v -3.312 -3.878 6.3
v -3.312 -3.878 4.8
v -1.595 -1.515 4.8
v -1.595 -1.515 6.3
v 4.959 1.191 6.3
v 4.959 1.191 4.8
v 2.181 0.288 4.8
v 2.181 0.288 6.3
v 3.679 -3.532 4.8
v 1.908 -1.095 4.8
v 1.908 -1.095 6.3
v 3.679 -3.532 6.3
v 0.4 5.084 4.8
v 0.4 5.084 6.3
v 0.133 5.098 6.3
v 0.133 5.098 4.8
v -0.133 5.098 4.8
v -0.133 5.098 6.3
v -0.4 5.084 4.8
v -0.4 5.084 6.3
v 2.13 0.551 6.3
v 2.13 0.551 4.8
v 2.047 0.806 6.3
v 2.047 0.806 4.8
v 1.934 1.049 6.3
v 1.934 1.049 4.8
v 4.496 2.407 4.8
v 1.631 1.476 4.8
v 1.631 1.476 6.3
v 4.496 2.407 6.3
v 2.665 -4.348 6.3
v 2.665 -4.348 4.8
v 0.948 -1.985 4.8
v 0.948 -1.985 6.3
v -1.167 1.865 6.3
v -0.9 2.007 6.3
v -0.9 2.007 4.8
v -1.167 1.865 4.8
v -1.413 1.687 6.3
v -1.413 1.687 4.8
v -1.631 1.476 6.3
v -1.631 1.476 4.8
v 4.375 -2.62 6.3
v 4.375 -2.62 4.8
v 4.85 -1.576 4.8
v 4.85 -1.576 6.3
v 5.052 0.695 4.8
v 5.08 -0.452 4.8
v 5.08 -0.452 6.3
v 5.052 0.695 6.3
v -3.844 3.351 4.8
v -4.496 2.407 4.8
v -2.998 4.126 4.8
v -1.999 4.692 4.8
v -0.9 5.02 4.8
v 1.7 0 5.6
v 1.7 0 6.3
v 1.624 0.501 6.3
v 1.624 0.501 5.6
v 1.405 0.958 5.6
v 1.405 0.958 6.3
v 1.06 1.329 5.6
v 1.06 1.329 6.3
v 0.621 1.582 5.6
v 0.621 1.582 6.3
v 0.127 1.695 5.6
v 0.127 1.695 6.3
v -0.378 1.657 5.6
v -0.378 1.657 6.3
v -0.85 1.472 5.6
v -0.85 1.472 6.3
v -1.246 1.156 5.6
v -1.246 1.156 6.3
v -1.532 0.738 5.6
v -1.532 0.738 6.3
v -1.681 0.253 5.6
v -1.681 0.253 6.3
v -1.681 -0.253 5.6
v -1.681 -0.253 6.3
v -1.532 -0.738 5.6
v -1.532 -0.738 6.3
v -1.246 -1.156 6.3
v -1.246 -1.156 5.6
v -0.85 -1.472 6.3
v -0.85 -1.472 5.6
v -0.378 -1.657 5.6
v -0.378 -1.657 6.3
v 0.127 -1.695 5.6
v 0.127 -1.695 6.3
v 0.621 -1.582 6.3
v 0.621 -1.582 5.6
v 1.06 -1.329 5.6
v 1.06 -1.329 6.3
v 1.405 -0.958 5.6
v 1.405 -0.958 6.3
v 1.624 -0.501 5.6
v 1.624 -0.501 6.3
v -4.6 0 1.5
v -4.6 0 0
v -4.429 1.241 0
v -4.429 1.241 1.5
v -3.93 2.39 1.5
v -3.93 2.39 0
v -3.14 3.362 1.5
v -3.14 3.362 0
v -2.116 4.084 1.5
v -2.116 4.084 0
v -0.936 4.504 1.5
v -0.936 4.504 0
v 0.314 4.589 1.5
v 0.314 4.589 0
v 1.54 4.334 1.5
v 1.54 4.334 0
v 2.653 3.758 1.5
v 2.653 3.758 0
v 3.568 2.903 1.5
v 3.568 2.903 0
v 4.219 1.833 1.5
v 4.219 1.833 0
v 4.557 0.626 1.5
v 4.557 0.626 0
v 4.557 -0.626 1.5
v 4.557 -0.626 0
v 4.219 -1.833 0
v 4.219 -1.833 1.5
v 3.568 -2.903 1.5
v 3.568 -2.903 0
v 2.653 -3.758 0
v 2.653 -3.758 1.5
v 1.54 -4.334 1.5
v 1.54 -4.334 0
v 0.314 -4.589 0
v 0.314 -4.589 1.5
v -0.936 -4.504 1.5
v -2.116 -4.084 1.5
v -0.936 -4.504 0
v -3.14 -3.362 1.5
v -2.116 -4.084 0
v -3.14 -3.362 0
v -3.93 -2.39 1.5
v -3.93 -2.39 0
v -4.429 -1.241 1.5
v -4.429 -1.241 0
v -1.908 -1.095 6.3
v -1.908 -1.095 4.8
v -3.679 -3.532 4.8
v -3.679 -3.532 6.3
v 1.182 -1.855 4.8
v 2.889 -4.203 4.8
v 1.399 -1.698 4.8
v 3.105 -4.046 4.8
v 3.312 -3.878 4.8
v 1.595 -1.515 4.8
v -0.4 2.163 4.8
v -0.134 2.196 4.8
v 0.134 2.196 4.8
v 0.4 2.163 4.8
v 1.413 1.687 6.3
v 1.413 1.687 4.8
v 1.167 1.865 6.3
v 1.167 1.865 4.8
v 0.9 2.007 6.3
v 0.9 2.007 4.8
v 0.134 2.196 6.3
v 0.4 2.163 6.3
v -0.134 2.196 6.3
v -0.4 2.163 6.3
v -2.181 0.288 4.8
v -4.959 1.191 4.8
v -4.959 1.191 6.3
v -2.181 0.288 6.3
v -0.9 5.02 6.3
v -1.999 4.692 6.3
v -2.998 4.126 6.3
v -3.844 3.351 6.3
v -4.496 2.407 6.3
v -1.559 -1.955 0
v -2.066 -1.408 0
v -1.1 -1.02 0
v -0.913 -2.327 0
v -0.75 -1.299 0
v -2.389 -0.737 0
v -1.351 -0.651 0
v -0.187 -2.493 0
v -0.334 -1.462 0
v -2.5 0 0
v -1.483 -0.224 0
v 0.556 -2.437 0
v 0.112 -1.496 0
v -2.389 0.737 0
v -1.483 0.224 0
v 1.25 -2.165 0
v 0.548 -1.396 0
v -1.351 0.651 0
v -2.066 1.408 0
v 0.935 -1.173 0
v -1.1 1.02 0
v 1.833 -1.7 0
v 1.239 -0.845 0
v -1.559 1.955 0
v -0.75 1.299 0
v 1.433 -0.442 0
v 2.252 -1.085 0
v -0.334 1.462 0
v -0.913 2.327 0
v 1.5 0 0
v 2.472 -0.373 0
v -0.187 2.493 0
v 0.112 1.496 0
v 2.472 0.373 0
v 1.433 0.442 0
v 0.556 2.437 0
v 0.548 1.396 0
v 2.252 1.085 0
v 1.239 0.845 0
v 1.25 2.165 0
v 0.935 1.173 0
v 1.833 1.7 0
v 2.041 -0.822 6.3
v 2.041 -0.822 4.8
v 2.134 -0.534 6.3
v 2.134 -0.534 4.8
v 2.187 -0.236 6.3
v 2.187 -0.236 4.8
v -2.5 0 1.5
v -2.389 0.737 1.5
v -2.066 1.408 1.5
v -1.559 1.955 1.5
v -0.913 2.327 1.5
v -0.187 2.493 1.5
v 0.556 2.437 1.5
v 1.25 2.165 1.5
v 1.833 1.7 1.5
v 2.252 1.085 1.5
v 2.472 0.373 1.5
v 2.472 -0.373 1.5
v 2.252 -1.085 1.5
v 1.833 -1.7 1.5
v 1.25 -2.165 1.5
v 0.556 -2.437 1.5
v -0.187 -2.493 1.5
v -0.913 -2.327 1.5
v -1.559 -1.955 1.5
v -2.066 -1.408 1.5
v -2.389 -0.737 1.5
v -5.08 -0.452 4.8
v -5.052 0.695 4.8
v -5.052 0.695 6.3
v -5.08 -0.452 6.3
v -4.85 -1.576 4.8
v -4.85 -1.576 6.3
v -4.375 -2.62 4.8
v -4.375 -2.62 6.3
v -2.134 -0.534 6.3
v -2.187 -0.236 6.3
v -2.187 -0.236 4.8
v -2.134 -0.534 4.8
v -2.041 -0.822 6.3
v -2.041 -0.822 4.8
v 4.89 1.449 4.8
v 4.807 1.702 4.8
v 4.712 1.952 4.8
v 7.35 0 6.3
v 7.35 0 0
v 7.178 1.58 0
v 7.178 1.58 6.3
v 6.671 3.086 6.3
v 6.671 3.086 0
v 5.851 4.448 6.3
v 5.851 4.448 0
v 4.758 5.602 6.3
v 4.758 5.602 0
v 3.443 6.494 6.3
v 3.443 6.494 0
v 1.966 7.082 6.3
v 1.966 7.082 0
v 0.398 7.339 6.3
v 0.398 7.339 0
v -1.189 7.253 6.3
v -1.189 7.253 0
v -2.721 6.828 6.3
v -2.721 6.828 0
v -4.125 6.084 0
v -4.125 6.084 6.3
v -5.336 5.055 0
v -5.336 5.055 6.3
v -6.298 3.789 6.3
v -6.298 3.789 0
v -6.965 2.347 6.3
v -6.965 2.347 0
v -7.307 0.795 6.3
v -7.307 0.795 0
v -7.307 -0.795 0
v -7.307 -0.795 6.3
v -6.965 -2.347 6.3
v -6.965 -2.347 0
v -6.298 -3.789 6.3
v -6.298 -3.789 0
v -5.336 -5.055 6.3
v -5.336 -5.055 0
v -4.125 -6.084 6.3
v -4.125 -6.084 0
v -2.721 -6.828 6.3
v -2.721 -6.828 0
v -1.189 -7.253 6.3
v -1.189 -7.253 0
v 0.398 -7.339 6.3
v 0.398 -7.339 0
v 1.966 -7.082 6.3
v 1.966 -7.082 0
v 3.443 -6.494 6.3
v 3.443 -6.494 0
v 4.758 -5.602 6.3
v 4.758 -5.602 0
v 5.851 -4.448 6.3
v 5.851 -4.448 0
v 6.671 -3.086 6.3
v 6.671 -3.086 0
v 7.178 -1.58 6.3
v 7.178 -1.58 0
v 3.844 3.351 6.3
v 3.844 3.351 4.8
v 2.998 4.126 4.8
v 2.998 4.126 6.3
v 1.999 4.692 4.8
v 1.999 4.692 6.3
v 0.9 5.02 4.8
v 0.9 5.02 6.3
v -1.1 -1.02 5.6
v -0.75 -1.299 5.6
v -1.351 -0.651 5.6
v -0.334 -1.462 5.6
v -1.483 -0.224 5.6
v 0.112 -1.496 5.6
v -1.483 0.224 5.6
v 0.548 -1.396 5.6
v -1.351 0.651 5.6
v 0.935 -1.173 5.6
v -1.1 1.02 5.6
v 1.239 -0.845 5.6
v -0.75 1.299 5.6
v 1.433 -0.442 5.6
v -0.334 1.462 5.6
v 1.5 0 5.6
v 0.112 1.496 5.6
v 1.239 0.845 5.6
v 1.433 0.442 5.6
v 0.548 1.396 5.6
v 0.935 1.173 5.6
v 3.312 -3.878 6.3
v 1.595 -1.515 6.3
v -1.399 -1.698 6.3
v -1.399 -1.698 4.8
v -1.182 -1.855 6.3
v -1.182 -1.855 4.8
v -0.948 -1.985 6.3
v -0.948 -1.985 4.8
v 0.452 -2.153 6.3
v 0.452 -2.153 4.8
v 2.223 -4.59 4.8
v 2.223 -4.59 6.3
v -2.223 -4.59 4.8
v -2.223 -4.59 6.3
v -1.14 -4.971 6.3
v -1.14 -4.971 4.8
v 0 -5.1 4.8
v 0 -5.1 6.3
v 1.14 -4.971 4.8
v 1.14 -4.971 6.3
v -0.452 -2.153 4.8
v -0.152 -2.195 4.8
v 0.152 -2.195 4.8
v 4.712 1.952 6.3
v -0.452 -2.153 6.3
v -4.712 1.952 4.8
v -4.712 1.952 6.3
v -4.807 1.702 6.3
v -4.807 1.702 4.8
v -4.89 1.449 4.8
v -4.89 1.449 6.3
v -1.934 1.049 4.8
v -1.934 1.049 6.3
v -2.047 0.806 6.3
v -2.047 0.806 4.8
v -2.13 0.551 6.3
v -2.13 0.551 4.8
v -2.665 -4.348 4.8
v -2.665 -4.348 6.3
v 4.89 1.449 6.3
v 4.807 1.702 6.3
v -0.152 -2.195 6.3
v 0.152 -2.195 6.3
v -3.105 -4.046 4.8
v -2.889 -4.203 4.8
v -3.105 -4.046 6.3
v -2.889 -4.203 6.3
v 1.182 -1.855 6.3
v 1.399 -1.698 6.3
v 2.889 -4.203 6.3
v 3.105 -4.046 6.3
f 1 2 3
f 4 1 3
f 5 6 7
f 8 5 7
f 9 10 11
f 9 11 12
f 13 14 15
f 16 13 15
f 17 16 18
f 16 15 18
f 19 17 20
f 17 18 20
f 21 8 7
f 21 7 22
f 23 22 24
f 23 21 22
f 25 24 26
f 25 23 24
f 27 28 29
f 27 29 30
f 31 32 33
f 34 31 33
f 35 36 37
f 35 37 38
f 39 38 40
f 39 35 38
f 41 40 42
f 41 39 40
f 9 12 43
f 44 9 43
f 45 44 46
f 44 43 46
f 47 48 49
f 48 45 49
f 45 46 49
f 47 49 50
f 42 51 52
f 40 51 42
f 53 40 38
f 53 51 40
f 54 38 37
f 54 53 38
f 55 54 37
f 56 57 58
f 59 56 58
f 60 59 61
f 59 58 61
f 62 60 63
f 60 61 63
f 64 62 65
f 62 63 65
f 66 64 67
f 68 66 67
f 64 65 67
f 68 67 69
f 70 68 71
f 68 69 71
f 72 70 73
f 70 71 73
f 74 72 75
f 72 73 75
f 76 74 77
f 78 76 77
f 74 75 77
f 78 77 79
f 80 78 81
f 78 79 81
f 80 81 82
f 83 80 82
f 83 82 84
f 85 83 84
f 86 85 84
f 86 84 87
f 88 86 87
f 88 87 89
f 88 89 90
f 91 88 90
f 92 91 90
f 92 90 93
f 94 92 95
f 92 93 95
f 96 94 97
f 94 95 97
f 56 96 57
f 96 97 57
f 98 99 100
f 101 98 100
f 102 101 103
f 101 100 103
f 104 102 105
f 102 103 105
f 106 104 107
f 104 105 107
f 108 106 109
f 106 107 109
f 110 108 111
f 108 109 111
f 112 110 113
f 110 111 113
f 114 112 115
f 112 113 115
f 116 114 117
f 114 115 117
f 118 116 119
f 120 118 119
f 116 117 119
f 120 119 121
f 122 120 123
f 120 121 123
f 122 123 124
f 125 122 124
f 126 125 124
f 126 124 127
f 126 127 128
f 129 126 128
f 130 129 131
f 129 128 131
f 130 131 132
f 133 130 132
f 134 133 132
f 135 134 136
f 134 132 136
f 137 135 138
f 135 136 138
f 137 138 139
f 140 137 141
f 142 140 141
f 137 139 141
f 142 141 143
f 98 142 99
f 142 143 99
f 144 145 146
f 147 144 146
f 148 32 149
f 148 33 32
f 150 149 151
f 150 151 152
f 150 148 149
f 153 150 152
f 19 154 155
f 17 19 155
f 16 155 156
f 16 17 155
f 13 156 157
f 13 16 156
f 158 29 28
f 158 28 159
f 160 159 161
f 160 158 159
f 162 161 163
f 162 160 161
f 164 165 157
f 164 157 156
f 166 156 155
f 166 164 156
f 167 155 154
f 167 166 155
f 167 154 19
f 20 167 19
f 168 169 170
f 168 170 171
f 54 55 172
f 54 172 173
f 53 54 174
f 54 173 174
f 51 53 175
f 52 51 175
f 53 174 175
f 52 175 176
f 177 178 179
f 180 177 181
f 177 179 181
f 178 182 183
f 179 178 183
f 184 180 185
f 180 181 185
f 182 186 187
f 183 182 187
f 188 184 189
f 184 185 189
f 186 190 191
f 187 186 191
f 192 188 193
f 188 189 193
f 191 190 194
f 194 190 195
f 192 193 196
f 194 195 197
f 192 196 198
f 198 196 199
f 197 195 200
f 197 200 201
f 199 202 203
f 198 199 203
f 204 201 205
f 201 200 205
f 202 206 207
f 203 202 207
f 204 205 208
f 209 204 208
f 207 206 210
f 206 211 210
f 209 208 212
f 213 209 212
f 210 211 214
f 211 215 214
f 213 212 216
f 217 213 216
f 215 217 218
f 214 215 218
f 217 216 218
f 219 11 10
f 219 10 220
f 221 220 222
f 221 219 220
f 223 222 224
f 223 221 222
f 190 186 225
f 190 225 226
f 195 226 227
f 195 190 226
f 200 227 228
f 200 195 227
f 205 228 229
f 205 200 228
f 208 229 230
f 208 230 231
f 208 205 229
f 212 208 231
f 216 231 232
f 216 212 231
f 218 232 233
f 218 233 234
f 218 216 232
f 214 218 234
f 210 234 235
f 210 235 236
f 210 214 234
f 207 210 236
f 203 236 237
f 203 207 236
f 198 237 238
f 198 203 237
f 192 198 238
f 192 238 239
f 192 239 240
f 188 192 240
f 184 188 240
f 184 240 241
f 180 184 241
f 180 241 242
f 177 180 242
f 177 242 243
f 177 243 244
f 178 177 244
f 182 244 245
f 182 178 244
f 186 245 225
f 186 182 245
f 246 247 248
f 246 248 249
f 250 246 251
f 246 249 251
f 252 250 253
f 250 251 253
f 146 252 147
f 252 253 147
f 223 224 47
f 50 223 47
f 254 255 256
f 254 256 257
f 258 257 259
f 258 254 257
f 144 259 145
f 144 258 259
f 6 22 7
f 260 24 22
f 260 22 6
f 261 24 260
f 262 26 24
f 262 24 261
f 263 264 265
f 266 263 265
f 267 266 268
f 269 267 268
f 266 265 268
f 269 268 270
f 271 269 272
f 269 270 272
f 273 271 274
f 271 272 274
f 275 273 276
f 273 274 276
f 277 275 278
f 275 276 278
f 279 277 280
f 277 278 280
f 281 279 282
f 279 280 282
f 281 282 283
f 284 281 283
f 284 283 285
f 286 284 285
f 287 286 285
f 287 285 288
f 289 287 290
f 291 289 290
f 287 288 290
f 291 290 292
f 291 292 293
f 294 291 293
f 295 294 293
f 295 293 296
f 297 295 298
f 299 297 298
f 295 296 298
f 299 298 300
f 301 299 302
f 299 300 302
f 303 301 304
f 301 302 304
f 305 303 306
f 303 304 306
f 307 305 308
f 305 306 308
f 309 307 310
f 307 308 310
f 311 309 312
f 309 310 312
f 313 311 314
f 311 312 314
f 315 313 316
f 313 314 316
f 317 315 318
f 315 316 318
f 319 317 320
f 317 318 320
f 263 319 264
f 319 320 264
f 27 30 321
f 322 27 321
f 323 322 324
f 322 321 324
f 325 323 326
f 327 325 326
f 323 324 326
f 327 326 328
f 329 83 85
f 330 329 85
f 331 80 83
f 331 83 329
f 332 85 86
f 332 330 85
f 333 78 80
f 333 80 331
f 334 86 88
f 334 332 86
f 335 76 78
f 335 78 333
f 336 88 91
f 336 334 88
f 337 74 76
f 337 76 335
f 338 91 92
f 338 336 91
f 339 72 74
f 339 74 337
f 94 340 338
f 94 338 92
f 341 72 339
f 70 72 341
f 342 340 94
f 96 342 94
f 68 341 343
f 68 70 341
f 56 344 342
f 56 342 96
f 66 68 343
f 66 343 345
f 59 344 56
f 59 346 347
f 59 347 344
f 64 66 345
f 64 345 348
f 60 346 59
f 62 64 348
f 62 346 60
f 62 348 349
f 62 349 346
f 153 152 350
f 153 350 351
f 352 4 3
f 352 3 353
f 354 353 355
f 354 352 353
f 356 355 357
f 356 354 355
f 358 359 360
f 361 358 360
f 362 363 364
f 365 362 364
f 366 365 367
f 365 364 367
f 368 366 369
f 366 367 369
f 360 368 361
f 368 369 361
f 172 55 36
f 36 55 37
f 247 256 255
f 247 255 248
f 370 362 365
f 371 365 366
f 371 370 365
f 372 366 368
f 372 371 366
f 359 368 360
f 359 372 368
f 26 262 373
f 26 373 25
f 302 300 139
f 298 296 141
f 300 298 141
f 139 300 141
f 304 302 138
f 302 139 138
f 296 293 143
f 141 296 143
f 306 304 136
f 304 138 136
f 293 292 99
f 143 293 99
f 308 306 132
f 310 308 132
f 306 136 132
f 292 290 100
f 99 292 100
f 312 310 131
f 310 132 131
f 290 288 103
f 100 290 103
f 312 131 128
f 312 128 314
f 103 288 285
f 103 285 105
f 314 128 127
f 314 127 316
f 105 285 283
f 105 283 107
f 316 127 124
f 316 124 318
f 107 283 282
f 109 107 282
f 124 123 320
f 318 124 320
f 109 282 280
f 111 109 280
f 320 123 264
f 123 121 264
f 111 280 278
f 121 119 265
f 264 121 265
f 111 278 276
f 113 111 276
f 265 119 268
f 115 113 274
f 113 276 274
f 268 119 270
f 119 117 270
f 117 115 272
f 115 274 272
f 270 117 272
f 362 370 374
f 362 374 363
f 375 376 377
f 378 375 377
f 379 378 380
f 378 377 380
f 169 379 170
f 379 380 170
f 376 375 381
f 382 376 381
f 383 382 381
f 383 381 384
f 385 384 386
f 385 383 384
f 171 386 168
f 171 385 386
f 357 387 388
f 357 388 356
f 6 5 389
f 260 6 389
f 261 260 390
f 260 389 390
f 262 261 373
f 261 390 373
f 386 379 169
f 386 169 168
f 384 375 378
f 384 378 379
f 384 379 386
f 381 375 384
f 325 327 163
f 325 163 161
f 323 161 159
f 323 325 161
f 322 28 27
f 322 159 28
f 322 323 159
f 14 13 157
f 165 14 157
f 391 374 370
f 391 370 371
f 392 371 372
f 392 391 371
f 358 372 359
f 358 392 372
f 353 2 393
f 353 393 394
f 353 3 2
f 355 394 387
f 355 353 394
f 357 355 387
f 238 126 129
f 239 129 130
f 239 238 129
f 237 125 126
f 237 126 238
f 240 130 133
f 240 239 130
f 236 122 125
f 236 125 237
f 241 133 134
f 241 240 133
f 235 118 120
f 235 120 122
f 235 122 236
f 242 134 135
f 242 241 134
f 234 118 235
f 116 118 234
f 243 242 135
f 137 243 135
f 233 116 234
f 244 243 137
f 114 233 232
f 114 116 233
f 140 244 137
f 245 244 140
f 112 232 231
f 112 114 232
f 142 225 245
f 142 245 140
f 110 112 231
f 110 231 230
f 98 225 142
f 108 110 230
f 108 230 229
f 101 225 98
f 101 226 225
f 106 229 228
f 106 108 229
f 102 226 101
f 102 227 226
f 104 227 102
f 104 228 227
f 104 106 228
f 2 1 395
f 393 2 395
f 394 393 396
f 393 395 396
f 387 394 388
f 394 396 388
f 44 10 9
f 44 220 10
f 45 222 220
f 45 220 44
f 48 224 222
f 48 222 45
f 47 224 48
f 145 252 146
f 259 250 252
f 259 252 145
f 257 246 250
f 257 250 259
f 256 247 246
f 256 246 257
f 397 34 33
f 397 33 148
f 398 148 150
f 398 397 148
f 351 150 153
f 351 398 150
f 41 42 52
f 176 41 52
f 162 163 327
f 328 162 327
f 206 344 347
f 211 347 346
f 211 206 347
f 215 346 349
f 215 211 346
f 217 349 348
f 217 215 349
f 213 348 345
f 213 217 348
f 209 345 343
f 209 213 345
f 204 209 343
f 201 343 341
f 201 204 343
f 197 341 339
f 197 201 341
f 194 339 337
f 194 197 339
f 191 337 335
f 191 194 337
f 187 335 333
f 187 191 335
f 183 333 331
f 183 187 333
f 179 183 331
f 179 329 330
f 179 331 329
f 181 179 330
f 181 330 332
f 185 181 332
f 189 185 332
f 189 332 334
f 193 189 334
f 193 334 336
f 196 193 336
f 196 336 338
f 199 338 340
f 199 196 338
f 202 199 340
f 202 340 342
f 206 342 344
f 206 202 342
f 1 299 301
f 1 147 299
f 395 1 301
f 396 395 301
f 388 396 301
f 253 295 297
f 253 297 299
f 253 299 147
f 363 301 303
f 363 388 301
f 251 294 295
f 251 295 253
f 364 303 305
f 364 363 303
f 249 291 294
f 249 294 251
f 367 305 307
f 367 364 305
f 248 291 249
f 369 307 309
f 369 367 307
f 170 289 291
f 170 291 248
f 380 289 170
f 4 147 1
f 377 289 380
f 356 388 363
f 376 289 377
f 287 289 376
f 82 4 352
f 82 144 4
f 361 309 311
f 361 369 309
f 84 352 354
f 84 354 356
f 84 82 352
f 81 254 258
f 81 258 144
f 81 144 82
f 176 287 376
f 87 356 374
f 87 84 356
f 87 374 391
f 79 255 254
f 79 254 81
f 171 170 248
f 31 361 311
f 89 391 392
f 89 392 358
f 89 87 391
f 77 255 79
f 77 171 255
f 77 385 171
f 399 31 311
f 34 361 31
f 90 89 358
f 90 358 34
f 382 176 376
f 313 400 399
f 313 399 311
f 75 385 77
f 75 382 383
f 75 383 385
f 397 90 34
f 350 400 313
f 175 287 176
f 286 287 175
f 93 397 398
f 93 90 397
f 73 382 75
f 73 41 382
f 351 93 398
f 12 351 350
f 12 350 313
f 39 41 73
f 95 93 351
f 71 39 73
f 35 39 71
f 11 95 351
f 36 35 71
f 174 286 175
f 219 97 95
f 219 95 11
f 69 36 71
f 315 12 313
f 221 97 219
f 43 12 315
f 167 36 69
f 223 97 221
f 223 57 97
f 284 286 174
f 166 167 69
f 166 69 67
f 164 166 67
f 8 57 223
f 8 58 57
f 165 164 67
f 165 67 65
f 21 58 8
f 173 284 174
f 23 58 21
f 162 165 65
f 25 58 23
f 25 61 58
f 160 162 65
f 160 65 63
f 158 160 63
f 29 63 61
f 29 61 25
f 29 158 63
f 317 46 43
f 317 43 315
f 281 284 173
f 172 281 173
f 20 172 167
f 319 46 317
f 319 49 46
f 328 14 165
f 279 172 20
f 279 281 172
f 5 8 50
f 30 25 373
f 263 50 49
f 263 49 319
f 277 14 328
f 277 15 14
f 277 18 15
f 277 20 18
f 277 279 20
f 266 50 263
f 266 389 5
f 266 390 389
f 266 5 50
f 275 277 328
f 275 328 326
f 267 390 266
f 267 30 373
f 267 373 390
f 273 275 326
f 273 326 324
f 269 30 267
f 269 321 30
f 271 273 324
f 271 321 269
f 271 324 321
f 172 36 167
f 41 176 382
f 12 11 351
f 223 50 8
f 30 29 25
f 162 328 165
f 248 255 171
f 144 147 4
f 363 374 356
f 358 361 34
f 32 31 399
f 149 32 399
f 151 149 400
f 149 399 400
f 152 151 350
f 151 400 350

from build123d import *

# Parameters (mm, degrees)
SKETCH1_R           = 5.6
SKETCH1_R_2         = 1.5
BOSS_EXTRUDE1_DEPTH = 6.3
SKETCH2_R           = 1.7
CUT_EXTRUDE1_DEPTH  = 0.7
SKETCH3_R           = 5.1
SKETCH3_R_2         = 2.2
CUT_EXTRUDE2_DEPTH  = 1.5
BOSS_EXTRUDE2_DEPTH = 1.5
SKETCH5_R           = 4.6
SKETCH5_R_2         = 2.5
CUT_EXTRUDE3_DEPTH  = 1.5
BOSS_EXTRUDE4_START = -6.3
SKETCH6_R           = 7.35
SKETCH6_R_2         = 5.6
BOSS_EXTRUDE4_DEPTH = 6.3


with BuildPart() as part:
    # Sketch1 → Boss-Extrude1 (new body)
    with BuildSketch(Plane.XY):
        Circle(SKETCH1_R)
        Circle(SKETCH1_R_2, mode=Mode.SUBTRACT)
    extrude(amount=BOSS_EXTRUDE1_DEPTH)

    # Sketch2 → Cut-Extrude1 (cut)
    with BuildSketch(Plane.XY.offset(6.3)):
        Circle(SKETCH2_R)
    extrude(amount=-CUT_EXTRUDE1_DEPTH, mode=Mode.SUBTRACT)

    # Sketch3 → Cut-Extrude2 (cut)
    with BuildSketch(Plane.XY.offset(6.3)):
        Circle(SKETCH3_R)
        Circle(SKETCH3_R_2, mode=Mode.SUBTRACT)
    extrude(amount=-CUT_EXTRUDE2_DEPTH, mode=Mode.SUBTRACT)

    # Sketch4 → Boss-Extrude2 (add)
    with BuildSketch(Plane.XY.offset(4.8)):
        Polygon((-0.9, 2.00748599), (-0.9, 5.019960159), (-0.9, 5.084289528), (-0.4, 5.084289528), (-0.4, 2.163330765), (-0.4, 2.00748599), align=None)
        Polygon((0.4, 5.084289528), (0.4, 2.163330765), (0.4, 2.00748599), (0.9, 2.00748599), (0.9, 5.019960159), (0.9, 5.084289528), align=None)
        Polygon((1.631117337, 1.476298152), (4.496150526, 2.407203865), (4.557331391, 2.427082733), (4.711839888, 1.951554475), (1.933843023, 1.048928577), (1.785625834, 1.000769893), align=None)
        Polygon((2.03283943, 0.23992468), (2.187347927, -0.235603578), (5.052381116, 0.695302136), (5.113561981, 0.715181004), (4.959053484, 1.190709262), (2.181056619, 0.288083364), align=None)
        Polygon((1.908085954, -1.095083555), (3.678773844, -3.532226353), (3.716585698, -3.584269905), (3.3120772, -3.878162531), (1.595180717, -1.515057253), (1.503577457, -1.388976181), align=None)
        Polygon((0.856363861, -1.859204383), (0.451855364, -2.153097009), (2.222543254, -4.590239807), (2.260355108, -4.642283359), (2.664863605, -4.348390733), (0.947967122, -1.985285454), align=None)
        Polygon((-0.451855364, -2.153097009), (-2.222543254, -4.590239807), (-2.260355108, -4.642283359), (-2.664863605, -4.348390733), (-0.947967122, -1.985285454), (-0.856363861, -1.859204383), align=None)
        Polygon((-1.503577457, -1.388976181), (-1.908085954, -1.095083555), (-3.678773844, -3.532226353), (-3.716585698, -3.584269905), (-3.3120772, -3.878162531), (-1.595180717, -1.515057253), align=None)
        Polygon((-2.187347927, -0.235603578), (-5.052381116, 0.695302136), (-5.113561981, 0.715181004), (-4.959053484, 1.190709262), (-2.181056619, 0.288083364), (-2.03283943, 0.23992468), align=None)
        Polygon((-1.785625834, 1.000769893), (-1.631117337, 1.476298152), (-4.496150526, 2.407203865), (-4.557331391, 2.427082733), (-4.711839888, 1.951554475), (-1.933843023, 1.048928577), align=None)
    extrude(amount=BOSS_EXTRUDE2_DEPTH)

    # Sketch5 → Cut-Extrude3 (cut)
    with BuildSketch(Plane(origin=(0, 0, 0), x_dir=(-1, 0, 0), z_dir=(0, 0, -1))):
        Circle(SKETCH5_R)
        Circle(SKETCH5_R_2, mode=Mode.SUBTRACT)
    extrude(amount=-CUT_EXTRUDE3_DEPTH, mode=Mode.SUBTRACT)

    # Sketch6 → Boss-Extrude4 (add)
    with BuildSketch(Plane.XY.offset(6.3).offset(BOSS_EXTRUDE4_START)):
        Circle(SKETCH6_R)
        Circle(SKETCH6_R_2, mode=Mode.SUBTRACT)
    extrude(amount=BOSS_EXTRUDE4_DEPTH)


solid = part.part
